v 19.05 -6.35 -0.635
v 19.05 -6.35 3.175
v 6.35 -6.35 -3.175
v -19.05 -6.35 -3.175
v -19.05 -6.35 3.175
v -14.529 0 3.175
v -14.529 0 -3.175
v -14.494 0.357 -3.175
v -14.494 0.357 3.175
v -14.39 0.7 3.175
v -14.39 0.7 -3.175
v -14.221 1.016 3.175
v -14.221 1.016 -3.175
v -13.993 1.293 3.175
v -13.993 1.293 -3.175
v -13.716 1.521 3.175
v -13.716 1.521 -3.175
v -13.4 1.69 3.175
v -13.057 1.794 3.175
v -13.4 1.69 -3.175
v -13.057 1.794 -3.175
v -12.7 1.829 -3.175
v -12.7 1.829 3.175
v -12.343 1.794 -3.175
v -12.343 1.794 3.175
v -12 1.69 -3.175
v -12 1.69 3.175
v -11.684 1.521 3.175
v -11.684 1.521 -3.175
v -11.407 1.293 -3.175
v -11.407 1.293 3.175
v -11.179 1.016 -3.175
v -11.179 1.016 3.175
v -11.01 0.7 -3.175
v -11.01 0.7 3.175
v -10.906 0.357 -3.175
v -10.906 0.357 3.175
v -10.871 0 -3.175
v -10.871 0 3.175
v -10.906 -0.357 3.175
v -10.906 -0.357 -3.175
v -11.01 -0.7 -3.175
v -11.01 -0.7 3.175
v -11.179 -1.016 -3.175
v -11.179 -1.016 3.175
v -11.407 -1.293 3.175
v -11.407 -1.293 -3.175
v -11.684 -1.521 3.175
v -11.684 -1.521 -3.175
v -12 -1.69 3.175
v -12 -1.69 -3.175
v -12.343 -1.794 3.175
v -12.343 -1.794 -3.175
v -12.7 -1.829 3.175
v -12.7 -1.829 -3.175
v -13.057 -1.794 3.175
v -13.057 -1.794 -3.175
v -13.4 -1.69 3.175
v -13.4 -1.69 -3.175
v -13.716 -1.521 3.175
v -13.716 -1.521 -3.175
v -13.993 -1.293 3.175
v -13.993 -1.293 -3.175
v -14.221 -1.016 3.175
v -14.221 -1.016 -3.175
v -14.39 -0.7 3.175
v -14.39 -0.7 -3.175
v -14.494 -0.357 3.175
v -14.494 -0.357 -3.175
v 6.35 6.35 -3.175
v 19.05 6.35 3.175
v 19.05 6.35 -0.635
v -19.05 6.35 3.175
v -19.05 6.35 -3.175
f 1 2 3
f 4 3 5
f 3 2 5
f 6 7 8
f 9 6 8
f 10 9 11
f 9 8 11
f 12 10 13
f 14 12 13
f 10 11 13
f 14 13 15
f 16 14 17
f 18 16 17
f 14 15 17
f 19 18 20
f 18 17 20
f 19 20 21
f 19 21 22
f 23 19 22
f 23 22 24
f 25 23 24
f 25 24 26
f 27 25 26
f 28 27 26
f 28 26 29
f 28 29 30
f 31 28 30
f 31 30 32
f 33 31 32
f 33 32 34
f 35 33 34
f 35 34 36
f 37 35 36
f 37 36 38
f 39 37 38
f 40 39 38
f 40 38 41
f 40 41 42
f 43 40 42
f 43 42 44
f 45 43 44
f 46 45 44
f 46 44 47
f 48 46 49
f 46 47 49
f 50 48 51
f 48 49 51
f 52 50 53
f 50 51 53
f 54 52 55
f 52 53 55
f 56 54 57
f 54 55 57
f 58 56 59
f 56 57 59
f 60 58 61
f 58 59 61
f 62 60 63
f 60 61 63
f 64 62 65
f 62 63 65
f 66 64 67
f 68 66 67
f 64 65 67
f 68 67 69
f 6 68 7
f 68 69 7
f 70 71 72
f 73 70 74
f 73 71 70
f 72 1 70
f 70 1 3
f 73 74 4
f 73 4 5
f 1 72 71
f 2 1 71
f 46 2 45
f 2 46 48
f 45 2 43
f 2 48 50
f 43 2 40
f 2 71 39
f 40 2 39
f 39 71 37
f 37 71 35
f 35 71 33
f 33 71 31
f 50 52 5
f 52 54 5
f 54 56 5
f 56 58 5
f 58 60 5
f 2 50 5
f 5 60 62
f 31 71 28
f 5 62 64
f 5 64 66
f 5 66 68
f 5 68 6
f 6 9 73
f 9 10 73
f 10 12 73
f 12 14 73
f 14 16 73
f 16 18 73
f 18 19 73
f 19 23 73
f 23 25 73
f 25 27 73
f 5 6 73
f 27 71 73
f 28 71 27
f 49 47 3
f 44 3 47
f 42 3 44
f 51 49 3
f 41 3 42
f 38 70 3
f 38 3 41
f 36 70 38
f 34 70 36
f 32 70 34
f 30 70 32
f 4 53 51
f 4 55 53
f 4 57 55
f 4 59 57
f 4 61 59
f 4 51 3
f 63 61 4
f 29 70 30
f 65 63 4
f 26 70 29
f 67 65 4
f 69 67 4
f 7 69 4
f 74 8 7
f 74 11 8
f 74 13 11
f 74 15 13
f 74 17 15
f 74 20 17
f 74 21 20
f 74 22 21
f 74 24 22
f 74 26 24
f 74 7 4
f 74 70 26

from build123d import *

# Parameters (mm, degrees)
SKETCH1_W                   = 38.1
SKETCH1_H                   = 6.35
BOSS_EXTRUDE1_DEPTH         = 6.35
F_27_0_144_DIAMETER_HOLE1_D = 3.6576
CUT_EXTRUDE1_DEPTH          = 13.7


with BuildPart() as part:
    # Sketch1 → Boss-Extrude1 (new body, symmetric)
    with BuildSketch(Plane(origin=(0, 0, 0), x_dir=(-1, 0, 0), z_dir=(0, 1, 0))):
        Rectangle(SKETCH1_W, SKETCH1_H)
    extrude(amount=BOSS_EXTRUDE1_DEPTH, both=True)

    # #27 (0.144) Diameter Hole1 (through all)
    with Locations(Plane.XY.offset(3.175)):
        with Locations((-12.7, 0)):
            Hole(F_27_0_144_DIAMETER_HOLE1_D / 2)

    # Sketch5 → Cut-Extrude1 (cut, through all)
    with BuildSketch(Plane.XZ.offset(6.35)):
        Polygon((19.05, -0.635), (6.35, -3.175), (19.05, -3.175), align=None)
    extrude(amount=-CUT_EXTRUDE1_DEPTH, mode=Mode.SUBTRACT)


solid = part.part
